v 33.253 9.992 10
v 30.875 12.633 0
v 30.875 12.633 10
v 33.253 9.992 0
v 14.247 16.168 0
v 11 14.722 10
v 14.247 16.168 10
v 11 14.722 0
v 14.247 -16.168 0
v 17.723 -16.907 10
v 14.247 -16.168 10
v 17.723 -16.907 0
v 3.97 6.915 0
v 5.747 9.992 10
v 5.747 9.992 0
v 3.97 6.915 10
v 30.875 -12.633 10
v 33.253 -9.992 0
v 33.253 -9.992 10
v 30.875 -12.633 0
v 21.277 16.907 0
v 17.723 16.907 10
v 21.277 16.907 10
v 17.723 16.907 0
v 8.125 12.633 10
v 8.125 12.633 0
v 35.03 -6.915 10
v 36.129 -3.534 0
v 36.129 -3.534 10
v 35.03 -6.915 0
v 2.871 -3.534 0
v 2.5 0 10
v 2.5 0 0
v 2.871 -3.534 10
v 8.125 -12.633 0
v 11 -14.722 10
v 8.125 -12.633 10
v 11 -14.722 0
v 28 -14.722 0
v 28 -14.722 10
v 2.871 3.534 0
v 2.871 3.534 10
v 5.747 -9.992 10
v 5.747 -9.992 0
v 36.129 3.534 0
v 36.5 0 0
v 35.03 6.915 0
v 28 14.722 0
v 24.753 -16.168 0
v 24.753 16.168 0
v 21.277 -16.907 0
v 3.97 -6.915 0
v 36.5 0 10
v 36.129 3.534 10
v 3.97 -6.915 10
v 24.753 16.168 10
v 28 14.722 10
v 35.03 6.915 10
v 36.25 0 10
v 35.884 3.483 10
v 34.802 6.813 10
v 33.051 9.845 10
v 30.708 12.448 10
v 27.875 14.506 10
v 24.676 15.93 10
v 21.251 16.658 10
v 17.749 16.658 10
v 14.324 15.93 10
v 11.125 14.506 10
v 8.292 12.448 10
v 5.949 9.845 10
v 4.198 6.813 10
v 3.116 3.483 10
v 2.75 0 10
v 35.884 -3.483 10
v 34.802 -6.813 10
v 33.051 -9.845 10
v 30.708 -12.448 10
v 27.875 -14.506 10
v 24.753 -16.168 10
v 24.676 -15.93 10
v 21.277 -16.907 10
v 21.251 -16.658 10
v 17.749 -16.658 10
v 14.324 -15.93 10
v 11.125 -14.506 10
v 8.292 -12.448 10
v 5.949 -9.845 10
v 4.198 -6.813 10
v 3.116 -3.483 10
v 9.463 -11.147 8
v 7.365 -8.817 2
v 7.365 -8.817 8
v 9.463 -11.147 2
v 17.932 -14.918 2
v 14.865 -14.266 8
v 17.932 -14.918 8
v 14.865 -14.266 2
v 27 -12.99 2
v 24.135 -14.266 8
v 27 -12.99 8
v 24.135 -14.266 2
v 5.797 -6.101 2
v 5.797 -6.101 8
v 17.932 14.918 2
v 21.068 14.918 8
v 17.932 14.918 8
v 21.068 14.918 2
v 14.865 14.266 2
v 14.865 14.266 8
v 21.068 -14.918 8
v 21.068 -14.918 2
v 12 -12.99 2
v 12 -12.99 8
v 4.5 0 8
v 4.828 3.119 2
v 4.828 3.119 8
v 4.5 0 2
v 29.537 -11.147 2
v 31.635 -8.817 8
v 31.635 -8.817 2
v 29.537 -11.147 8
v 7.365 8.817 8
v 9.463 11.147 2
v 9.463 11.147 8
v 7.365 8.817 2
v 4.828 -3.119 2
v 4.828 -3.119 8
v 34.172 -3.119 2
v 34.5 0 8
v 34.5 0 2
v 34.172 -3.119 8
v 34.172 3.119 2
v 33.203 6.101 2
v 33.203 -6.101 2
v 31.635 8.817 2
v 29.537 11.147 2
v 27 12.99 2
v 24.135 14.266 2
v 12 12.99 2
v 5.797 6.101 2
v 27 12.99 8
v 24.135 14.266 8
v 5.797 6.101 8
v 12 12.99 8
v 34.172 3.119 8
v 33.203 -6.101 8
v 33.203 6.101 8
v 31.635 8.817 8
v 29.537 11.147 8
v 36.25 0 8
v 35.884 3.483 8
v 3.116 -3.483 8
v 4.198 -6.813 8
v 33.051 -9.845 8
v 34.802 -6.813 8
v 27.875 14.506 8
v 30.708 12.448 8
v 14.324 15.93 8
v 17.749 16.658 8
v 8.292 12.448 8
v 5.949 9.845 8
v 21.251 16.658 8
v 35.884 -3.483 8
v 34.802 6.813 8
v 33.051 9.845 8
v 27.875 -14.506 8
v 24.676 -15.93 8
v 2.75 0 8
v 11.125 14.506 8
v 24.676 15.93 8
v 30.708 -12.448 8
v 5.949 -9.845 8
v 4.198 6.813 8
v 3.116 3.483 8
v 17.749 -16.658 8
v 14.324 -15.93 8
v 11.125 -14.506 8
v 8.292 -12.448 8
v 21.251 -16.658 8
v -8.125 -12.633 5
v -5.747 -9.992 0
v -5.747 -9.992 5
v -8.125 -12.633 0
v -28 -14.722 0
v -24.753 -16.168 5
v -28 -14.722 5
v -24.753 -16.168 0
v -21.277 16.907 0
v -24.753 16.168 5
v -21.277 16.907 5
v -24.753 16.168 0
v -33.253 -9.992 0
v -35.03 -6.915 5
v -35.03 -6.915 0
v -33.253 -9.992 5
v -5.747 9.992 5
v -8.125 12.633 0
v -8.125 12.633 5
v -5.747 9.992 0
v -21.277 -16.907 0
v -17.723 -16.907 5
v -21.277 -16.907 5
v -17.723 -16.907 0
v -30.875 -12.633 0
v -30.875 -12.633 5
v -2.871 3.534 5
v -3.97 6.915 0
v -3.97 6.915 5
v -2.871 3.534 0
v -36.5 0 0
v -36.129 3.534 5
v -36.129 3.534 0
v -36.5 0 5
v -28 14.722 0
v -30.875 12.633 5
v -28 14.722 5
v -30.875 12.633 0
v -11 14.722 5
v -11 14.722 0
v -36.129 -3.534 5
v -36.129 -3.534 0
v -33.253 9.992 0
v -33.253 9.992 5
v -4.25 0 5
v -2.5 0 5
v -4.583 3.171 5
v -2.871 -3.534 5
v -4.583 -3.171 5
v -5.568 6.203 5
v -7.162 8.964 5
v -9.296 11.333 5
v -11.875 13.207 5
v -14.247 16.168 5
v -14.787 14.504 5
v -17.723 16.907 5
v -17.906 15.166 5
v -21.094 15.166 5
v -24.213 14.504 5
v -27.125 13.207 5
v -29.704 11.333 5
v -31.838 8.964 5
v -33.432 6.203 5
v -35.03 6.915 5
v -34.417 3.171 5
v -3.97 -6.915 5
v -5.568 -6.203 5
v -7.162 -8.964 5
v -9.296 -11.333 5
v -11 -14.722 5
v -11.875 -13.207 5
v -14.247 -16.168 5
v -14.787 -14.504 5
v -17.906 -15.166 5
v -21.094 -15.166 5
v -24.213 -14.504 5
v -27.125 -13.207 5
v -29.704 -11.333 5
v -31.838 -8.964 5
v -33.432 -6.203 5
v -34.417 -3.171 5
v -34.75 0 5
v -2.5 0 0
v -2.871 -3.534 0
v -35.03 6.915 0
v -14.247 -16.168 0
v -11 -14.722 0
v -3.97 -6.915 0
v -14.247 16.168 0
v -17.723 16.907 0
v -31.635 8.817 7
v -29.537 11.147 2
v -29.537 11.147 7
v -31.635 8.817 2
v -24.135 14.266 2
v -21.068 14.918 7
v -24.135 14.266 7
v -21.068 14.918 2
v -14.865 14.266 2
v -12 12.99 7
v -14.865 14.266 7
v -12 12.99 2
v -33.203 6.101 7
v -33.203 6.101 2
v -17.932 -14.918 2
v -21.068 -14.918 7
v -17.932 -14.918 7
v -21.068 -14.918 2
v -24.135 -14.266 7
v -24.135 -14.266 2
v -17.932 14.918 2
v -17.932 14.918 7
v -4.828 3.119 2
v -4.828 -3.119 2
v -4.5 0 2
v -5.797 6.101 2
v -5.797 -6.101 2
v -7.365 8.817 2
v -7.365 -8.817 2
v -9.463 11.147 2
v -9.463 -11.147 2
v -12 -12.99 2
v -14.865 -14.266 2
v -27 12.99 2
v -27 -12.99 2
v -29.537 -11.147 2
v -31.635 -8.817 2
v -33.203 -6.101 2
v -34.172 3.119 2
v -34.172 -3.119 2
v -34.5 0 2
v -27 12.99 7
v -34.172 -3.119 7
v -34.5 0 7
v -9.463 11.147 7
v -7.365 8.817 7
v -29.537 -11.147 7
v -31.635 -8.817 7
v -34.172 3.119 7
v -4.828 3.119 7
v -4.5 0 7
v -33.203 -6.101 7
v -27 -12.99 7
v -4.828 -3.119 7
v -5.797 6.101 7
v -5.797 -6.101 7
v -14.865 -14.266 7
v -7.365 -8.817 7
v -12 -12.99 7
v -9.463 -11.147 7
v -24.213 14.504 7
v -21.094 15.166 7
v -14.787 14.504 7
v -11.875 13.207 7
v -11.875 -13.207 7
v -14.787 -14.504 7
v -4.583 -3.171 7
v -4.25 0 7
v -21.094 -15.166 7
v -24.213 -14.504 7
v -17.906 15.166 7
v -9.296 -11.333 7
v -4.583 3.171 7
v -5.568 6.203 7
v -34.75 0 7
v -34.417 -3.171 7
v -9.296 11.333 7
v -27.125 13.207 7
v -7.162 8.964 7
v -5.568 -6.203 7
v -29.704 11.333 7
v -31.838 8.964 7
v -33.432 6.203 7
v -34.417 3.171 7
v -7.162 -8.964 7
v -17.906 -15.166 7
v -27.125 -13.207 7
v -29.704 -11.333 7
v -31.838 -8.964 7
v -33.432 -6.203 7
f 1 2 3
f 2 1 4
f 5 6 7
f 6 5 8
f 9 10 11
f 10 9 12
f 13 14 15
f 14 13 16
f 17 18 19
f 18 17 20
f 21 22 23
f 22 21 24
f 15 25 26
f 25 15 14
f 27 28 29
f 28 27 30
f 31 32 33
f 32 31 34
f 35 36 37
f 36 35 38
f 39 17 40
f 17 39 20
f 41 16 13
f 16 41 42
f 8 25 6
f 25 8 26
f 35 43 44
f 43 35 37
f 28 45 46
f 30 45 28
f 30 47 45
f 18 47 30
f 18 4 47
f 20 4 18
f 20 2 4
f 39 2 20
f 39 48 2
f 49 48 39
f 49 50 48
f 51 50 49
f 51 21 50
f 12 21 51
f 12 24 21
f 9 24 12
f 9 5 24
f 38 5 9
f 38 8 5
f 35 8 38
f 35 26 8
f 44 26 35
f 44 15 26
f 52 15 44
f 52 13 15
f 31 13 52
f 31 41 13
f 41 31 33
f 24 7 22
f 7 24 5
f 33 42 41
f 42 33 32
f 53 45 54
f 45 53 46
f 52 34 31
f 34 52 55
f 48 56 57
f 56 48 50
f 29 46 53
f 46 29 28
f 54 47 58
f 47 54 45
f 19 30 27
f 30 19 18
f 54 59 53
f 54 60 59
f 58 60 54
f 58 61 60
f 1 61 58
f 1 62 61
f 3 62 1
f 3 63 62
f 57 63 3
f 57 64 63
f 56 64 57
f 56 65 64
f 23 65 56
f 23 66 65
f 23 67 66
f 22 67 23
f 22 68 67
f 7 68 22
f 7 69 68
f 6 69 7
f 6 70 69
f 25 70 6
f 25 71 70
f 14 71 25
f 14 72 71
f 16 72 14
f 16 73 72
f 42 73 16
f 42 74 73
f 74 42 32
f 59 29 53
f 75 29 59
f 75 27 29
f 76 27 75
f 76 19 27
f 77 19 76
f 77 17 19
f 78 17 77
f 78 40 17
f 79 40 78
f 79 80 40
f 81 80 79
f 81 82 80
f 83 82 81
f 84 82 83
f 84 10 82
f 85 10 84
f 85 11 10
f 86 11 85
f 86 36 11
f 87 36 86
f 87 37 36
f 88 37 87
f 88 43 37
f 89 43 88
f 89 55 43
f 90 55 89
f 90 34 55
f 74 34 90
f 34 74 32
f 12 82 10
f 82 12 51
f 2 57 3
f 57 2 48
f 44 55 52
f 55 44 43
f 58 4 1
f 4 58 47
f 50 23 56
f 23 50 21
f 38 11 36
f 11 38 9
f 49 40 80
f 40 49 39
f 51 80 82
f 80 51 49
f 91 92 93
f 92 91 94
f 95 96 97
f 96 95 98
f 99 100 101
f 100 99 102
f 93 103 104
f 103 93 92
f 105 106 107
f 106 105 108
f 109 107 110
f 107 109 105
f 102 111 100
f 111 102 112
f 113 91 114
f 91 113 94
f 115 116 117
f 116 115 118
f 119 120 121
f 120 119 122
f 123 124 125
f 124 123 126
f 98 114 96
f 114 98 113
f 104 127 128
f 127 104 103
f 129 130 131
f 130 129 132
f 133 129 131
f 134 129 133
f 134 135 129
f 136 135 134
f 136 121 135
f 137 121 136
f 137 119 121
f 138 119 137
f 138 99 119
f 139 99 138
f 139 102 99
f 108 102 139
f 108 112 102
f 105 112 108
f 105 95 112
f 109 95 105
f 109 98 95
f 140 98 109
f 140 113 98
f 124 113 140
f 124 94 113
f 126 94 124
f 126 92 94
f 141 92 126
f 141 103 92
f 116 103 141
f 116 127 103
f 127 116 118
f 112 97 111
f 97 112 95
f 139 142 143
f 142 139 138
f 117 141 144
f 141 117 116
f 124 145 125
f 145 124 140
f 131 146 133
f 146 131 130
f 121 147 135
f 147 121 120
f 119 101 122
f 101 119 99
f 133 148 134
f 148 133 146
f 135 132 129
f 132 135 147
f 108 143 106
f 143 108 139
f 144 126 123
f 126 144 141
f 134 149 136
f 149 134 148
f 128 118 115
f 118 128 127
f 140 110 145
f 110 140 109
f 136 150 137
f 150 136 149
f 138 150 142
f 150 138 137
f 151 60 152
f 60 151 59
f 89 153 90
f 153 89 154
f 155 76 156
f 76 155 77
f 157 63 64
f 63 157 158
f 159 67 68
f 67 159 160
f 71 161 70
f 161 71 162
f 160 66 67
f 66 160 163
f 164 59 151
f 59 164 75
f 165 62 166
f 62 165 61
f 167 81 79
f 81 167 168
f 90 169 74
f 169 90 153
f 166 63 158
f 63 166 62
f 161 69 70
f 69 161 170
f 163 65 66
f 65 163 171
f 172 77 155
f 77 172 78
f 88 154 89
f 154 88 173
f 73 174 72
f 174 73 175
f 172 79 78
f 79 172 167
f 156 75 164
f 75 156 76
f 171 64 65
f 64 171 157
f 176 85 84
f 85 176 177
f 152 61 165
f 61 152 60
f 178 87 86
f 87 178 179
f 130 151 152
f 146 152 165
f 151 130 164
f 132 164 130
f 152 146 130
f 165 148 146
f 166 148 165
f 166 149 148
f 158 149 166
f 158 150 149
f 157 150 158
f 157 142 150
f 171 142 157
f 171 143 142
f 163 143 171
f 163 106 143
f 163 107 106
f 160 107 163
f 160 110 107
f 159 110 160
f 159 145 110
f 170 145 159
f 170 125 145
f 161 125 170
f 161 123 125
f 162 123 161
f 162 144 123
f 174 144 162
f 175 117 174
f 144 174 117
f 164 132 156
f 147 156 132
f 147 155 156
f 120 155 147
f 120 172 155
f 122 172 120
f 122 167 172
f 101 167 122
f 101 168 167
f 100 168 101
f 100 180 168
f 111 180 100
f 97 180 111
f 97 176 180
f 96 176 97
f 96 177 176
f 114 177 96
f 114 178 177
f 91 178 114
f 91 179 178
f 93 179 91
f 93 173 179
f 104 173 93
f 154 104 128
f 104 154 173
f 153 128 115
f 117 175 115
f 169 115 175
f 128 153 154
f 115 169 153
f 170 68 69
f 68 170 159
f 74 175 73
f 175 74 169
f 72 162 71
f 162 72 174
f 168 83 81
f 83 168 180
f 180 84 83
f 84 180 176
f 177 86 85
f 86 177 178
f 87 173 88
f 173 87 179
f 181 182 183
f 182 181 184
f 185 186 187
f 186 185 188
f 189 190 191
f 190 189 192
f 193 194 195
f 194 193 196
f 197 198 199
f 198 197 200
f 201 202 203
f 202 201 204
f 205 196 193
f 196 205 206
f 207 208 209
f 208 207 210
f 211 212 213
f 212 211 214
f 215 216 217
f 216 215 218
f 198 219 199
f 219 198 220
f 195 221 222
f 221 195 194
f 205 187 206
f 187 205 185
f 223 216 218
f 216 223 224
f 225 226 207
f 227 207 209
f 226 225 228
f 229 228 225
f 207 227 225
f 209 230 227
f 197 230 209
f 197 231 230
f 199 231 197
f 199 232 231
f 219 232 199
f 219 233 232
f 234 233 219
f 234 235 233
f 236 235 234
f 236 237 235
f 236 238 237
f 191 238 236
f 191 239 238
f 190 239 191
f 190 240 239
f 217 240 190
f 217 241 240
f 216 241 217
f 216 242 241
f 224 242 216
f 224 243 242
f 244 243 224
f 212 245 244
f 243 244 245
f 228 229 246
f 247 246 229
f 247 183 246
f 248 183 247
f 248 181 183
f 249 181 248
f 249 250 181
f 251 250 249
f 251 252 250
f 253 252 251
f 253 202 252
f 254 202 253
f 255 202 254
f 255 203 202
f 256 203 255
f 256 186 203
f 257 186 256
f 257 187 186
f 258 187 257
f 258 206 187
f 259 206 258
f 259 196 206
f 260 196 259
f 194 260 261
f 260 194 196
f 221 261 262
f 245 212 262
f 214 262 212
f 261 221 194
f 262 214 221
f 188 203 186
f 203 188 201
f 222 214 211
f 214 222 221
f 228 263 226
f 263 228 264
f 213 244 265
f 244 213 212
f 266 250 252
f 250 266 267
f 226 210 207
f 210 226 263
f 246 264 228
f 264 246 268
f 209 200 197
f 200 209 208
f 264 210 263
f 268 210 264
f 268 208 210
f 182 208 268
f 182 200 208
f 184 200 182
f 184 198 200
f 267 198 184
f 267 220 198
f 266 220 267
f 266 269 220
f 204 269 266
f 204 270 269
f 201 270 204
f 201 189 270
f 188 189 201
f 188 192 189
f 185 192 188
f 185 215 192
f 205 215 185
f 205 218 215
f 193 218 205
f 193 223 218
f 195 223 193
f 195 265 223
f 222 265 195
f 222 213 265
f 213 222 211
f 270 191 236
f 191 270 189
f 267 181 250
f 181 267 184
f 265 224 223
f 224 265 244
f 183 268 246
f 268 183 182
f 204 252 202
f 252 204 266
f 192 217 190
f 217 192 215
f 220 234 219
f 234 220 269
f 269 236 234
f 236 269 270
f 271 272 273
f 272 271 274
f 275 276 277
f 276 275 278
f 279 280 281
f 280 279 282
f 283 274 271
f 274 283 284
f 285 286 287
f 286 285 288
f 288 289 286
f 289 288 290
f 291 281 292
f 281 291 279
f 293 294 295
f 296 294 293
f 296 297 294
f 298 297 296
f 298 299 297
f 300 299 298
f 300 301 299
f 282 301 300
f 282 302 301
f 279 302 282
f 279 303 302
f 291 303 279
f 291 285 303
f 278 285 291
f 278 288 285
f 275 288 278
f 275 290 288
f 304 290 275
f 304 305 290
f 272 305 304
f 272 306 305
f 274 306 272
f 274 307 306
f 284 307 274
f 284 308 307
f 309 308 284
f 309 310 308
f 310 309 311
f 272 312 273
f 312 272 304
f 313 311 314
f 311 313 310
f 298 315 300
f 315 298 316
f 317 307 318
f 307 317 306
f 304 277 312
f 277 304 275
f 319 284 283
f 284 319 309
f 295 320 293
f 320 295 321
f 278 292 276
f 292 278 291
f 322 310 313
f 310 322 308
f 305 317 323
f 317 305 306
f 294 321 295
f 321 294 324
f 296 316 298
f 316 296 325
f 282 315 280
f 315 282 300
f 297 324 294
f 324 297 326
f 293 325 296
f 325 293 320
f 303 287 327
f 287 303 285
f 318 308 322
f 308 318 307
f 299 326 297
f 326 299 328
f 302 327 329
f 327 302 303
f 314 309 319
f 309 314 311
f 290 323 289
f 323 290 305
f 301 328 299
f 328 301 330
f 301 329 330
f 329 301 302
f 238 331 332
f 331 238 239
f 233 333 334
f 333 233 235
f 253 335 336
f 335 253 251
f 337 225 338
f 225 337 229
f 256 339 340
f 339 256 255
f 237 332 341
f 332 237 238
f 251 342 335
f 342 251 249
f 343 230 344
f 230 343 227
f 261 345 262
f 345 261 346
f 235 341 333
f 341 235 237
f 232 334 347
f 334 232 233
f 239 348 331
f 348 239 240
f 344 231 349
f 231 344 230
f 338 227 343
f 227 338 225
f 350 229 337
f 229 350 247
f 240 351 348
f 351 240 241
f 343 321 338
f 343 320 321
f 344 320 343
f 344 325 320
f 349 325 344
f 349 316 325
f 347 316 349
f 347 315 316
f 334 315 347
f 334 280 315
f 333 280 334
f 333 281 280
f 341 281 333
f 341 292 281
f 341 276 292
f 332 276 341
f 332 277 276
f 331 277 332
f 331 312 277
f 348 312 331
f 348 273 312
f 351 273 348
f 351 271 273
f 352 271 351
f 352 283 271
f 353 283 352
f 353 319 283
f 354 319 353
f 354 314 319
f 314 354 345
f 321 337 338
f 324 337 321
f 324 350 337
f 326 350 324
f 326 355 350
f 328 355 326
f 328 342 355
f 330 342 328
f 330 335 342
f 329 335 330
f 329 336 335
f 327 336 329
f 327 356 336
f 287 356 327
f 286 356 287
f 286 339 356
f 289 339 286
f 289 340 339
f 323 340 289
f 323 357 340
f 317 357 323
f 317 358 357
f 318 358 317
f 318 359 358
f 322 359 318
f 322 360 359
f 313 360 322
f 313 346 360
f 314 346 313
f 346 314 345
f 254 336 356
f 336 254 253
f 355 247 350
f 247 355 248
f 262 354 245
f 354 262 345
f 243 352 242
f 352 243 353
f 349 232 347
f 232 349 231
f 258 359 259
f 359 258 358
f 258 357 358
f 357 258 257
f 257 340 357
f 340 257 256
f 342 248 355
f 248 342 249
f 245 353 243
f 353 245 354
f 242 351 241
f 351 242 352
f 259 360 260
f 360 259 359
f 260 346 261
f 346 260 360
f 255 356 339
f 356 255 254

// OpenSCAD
/*
	Autor: Michal Majercik <majermi6@fit.cvut.cz>
	Parametricky model krabicky
*/

module box_prototype ( x=30, y=30, rad=15, h=8, r=15 ){
	x_pos=(x-2*rad)/2; // x-ova suradnica centra valca tvoriaceho roh krabicky
	y_pos=(y-2*rad)/2; // y-ova suradnica ...

	if( r<=0 ){
		cube ( size=[x, y, h], center=true ); // v pripade rad <=0 je roh pravouhly
	} else {
		hull(){ // vykresli 4 krajne valce a potom to "ohulli"
			translate( [x_pos, y_pos, 0] )
			cylinder( h=h, r=r, center=true );

			translate( [-x_pos, y_pos, 0] )
			cylinder( h=h, r=r, center=true );

			translate( [x_pos, -y_pos, 0] )
			cylinder( h=h, r=r, center=true );

			translate( [-x_pos, -y_pos, 0] )
			cylinder( h=h, r=r, center=true );
		}
	}
}

module box_bottom( x=30, y=30, z1=5, rad=15, 
				 		 wall_thick=2, lock_z=2, reserve=0 ){
	difference(){
		box_prototype( x, y, rad, z1, rad+wall_thick ); // vytvori "vonkajsi obal" krabicky
		translate( [0, 0, wall_thick/2] ) // posunutie vyrezu vyssie
			box_prototype( x, y, rad, z1-wall_thick, rad ); // vyreze vnutro
		translate( [0, 0, (z1-lock_z)/2] ) // posunutie zubu na okraj
			box_prototype( x, y, rad, lock_z, rad+wall_thick/2+reserve/2 ); // vyreze zub
	}
}


module box_top( x=30, y=30, z2=5, rad=15, 
				 	 wall_thick=2, lock_z=2, reserve=0 ){
	difference(){
		box_prototype( x, y, rad, z2, rad+wall_thick ); // vytvori "vonkajsi obal" krabicky
		translate( [0, 0, -wall_thick/2] ) // necha dno
			box_prototype( x, y, rad, z2-wall_thick, rad ); // "vyreze" vnutro
	}
	translate( [0, 0, -((z2+lock_z)/2)] ) // vytvori zub
		difference(){
			box_prototype( x, y, rad, lock_z, rad+wall_thick/2-reserve/2 );
			box_prototype( x, y, rad, lock_z, rad );
		}
}


module box ( x=30, y=30, z1=10, z2=5, rad=15, 
				 wall_thick=2, lock_z=2, reserve=1.5, 
				 to_print=true, print_space=5 ){
	// spravne nastavenie premennych
	max_rad= x/2>y/2 ? y/2 : x/2;
	rad= rad>max_rad ? max_rad : (rad>0 ? rad : 0); // vypocet max radiusu
	z1= z1>=(wall_thick+lock_z) ? z1 : wall_thick+lock_z; // nastavenie z1 na odpovedajucu velkost v pripade ze z1<=wall_thick+lock_z
	z2= z2>=wall_thick ? z2 : wall_thick; // nastavenie z2 ...
	reserve= reserve>=0 ? reserve : 0; // pripad ze reserve<0
	lock_z= lock_z>=0 ? lock_z : 0;  // ...
	
	if( x>0 && y>0 && wall_thick>0 ){ // pripad kedy sa krabicky vykresluju
		if( to_print == false){ // nad sebou
			translate( [0, 0, z1/2] )
				box_bottom( x, y, z1, rad, wall_thick, lock_z, reserve );
			translate( [0, 0, z1+z2/2+reserve] )
				box_top( x, y, z2, rad, wall_thick, lock_z, reserve );
		}
		else{ // vedla seba
			translate( [x/2+wall_thick+print_space/2, 0, z1/2] )
				box_bottom( x, y, z1, rad, wall_thick, lock_z, reserve );
			rotate( [180,0,0] )
				translate( [-(x/2+wall_thick+print_space/2), 0, -(z2/2)] )
					box_top( x, y, z2, rad, wall_thick, lock_z, reserve );
		}
	}
}

box( 
x=30, 
y=30, 
z1=10, 
z2=5, 
rad=15, 
wall_thick=2, 
lock_z=2, 
reserve=1.5, 
to_print=true, 
print_space=5 
);
